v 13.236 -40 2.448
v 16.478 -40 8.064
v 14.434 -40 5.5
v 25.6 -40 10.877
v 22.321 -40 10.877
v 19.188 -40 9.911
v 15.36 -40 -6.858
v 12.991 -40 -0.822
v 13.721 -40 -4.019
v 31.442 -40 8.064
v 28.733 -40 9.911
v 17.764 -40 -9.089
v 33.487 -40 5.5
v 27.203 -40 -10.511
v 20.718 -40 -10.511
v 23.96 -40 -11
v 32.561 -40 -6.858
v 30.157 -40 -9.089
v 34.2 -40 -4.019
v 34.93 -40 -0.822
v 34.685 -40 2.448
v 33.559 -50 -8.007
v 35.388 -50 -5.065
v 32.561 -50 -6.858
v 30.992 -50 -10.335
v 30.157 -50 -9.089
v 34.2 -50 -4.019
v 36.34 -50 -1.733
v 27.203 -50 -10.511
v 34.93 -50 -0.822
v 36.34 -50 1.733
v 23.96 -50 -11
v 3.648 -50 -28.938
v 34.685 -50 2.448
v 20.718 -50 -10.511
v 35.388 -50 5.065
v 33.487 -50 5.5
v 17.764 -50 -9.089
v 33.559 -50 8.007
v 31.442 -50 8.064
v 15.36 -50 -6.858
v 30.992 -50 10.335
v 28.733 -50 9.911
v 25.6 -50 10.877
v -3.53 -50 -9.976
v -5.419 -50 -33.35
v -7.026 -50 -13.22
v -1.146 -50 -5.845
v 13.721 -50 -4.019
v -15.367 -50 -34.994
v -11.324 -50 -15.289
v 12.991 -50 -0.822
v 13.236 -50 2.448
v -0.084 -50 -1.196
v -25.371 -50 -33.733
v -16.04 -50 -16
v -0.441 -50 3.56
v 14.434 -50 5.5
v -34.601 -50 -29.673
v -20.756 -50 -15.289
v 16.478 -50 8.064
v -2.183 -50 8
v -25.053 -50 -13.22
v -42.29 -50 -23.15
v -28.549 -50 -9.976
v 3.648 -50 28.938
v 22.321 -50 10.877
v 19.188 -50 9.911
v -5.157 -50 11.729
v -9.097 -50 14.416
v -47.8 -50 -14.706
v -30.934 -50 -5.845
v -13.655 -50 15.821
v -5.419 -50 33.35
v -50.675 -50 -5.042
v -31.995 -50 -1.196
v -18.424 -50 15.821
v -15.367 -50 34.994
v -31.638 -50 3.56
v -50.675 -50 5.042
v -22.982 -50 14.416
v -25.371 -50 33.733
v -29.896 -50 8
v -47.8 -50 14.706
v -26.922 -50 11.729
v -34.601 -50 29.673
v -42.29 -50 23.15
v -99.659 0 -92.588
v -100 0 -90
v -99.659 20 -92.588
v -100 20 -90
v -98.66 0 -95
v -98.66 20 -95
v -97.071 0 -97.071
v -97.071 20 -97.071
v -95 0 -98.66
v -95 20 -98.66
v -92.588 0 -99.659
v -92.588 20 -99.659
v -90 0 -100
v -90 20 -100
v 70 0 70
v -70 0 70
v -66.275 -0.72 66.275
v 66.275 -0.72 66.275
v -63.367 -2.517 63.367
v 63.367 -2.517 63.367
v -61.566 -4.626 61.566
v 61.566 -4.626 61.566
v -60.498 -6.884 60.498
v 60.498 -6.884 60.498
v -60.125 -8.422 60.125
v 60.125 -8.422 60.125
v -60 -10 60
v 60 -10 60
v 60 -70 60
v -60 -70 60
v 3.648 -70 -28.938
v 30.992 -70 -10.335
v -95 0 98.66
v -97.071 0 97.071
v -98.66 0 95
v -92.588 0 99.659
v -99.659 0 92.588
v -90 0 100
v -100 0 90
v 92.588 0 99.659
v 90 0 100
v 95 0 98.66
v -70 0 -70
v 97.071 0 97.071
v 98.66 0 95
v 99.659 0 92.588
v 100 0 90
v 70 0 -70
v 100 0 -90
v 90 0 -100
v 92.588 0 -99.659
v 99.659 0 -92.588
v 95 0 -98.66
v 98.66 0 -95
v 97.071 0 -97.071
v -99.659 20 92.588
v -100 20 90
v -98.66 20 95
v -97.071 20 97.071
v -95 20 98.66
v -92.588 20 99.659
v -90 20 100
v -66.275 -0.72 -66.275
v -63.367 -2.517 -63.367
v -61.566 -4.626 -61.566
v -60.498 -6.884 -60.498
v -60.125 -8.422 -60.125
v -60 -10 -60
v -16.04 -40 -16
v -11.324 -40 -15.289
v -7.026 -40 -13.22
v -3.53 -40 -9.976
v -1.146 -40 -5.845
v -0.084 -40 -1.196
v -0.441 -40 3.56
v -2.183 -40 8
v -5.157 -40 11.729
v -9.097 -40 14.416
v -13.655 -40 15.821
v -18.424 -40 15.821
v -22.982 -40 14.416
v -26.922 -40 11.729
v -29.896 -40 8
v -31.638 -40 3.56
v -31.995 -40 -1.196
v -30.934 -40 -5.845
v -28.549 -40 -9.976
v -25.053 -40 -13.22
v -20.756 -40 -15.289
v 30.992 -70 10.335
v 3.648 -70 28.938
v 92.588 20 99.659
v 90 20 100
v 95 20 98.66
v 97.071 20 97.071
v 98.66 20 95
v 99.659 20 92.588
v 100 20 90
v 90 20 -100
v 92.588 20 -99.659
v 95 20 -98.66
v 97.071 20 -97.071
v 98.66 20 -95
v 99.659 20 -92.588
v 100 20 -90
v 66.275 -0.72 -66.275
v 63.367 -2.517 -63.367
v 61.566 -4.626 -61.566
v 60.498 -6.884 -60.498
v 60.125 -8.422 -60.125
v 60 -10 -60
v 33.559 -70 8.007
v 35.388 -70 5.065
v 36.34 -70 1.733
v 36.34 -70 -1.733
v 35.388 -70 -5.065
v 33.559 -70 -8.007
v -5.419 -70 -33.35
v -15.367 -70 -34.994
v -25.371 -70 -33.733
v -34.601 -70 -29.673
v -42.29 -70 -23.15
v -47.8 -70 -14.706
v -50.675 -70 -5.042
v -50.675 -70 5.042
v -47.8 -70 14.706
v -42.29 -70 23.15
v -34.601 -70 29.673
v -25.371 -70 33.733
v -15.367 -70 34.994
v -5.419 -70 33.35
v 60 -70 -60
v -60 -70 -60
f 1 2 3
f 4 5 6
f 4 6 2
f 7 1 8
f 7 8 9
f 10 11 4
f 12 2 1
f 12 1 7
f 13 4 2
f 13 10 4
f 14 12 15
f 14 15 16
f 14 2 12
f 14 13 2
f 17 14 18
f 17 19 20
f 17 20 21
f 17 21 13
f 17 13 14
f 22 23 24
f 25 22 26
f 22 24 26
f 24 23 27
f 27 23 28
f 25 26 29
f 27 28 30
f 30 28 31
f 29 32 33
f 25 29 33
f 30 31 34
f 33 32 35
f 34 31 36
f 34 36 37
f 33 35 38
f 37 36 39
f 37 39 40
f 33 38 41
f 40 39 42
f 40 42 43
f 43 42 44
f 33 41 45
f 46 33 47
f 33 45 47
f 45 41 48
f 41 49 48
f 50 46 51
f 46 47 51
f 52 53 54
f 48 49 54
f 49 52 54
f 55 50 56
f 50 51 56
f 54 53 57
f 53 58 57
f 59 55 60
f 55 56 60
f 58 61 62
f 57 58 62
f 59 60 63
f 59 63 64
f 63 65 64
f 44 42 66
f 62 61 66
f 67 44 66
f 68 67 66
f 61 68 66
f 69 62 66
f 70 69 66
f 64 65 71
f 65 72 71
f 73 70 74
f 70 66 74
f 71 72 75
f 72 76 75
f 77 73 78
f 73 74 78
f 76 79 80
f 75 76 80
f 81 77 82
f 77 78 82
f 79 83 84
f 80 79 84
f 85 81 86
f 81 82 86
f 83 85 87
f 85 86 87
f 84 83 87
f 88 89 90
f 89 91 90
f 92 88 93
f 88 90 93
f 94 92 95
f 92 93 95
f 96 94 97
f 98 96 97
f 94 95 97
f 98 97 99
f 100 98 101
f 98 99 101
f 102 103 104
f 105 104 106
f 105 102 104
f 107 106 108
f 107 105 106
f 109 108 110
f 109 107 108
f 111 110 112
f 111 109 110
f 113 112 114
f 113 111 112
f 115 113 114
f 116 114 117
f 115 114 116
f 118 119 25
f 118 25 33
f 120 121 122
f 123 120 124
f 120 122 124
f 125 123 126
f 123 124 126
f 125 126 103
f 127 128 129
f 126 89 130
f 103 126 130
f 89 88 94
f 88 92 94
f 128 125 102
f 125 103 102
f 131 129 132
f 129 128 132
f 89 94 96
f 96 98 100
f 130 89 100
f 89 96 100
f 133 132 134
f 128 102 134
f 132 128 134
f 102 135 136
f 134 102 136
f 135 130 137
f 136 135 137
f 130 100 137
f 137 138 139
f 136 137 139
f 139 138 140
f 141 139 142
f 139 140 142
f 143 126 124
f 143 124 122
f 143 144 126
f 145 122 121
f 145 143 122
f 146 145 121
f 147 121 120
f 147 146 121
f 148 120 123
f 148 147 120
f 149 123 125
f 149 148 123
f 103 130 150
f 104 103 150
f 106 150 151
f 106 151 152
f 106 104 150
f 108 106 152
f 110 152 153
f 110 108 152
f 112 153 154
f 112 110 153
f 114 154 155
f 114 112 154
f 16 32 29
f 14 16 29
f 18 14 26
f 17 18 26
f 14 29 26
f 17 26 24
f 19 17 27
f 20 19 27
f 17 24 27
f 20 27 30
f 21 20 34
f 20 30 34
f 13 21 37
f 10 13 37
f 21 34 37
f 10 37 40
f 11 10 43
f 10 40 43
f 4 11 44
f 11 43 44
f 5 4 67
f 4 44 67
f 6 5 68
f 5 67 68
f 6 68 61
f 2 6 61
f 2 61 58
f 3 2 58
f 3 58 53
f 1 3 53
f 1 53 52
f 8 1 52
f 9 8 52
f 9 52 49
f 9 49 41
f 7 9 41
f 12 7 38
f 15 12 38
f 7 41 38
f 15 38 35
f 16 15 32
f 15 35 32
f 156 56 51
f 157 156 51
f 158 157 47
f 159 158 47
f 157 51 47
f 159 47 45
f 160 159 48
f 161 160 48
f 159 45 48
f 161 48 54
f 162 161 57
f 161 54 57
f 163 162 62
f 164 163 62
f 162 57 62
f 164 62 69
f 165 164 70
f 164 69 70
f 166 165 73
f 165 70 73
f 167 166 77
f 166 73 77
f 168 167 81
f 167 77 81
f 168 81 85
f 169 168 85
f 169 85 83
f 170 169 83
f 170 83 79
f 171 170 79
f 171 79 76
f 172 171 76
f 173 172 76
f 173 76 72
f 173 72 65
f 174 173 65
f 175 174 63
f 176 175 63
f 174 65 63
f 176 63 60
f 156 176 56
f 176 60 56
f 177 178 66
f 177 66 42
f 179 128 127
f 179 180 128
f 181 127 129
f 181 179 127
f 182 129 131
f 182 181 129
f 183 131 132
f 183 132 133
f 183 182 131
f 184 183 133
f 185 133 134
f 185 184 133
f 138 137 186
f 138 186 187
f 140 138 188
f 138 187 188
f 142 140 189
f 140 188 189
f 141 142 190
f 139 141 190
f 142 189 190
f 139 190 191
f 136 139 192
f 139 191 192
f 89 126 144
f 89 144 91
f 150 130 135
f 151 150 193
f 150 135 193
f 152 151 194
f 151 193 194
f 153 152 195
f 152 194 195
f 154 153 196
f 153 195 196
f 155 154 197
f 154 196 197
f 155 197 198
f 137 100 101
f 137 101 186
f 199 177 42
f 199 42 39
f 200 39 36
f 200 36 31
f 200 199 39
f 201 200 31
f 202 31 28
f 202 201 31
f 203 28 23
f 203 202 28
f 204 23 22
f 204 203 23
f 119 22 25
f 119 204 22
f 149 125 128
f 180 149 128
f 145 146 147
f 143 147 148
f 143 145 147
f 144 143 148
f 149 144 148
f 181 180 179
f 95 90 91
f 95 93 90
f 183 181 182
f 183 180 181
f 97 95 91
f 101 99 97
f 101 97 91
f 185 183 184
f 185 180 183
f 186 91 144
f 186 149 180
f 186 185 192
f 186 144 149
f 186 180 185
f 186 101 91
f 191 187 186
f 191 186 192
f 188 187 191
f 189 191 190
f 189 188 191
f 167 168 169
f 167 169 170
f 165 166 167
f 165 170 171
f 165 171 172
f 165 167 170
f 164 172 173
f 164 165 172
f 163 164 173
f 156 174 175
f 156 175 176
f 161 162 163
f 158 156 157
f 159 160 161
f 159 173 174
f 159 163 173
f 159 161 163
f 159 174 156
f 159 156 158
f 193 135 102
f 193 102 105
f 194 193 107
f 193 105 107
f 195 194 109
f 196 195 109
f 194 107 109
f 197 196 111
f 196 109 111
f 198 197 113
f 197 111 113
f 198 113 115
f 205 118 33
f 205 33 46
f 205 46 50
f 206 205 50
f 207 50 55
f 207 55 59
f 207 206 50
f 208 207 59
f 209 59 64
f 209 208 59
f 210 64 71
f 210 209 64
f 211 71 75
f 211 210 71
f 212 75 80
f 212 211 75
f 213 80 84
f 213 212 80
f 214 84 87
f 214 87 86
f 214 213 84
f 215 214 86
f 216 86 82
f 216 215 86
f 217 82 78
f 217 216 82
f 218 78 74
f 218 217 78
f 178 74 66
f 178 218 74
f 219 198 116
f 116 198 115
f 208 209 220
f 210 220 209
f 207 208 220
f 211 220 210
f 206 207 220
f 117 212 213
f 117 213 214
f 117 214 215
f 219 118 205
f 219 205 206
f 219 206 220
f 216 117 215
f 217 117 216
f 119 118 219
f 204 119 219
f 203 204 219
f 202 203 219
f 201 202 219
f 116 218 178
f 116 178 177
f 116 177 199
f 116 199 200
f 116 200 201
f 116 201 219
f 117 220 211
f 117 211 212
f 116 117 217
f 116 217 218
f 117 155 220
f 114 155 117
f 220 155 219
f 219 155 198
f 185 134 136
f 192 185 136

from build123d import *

# Parameters (mm, degrees)
SKETCH1_W           = 200
SKETCH1_H           = 200
BOSS_EXTRUDE1_DEPTH = 20
SKETCH3_W           = 120
SKETCH3_H           = 120
BOSS_EXTRUDE2_DEPTH = 70
CUT_EXTRUDE1_DEPTH  = 20
SKETCH5_R           = 16
SKETCH5_R_2         = 11
CUT_EXTRUDE2_DEPTH  = 10
FILLET1_R           = 10
FILLET4_R           = 10


with BuildPart() as part:
    # Sketch1 → Boss-Extrude1 (new body)
    with BuildSketch(Plane(origin=(0, 0, 0), x_dir=(1, 0, 0), z_dir=(0, 1, 0))):
        Rectangle(SKETCH1_W, SKETCH1_H)
    extrude(amount=BOSS_EXTRUDE1_DEPTH)

    # Sketch3 → Boss-Extrude2 (add)
    with BuildSketch(Plane.XZ):
        Rectangle(SKETCH3_W, SKETCH3_H)
    extrude(amount=BOSS_EXTRUDE2_DEPTH)

    # Sketch4 → Cut-Extrude1 (cut)
    with BuildSketch(Plane.XZ.offset(70)):
        with BuildLine():
            Line((3.647893136, 28.937904965), (30.991643136, 10.334966059))
            ThreePointArc((30.991643136, 10.334966059), (36.460393136, 0), (30.991643136, -10.334966059))
            Line((30.991643136, -10.334966059), (3.647893136, -28.937904965))
            ThreePointArc((3.647893136, -28.937904965), (-51.039606864, 0), (3.647893136, 28.937904965))
        make_face()
    extrude(amount=-CUT_EXTRUDE1_DEPTH, mode=Mode.SUBTRACT)

    # Sketch5 → Cut-Extrude2 (cut)
    with BuildSketch(Plane.XZ.offset(50)):
        with Locations(Location((-16.039606864, 0, 0), (0, 0, 270))):
            Circle(SKETCH5_R)
        with Locations(Location((23.960393136, 0, 0), (0, 0, 270))):
            Circle(SKETCH5_R_2)
    extrude(amount=-CUT_EXTRUDE2_DEPTH, mode=Mode.SUBTRACT)

    # Fillet1
    fillet1_edges = [part.edges().sort_by_distance(p)[0] for p in [
        (100, 10, 100),
        (-100, 10, 100),
        (-100, 10, -100),
        (100, 10, -100),
    ]]
    fillet(fillet1_edges, radius=FILLET1_R)

    # Fillet4
    fillet4_edges = [part.edges().sort_by_distance(p)[0] for p in [
        (60, 0, 0),
        (0, 0, 60),
        (-60, 0, 0),
        (0, 0, -60),
    ]]
    fillet(fillet4_edges, radius=FILLET4_R)


solid = part.part
